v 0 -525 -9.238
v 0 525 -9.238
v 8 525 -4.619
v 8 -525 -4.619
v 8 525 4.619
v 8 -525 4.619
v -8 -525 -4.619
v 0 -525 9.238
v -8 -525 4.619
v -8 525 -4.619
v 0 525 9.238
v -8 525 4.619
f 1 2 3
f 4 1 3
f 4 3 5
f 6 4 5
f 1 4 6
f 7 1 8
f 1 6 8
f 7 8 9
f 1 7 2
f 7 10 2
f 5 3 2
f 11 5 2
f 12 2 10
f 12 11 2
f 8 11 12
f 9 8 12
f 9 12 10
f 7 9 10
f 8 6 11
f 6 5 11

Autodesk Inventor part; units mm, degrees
ref_plane "YZ Plane" through (0, 0, 0) normal (1, 0, 0) x (0, 1, 0)
ref_plane "XZ Plane" through (0, 0, 0) normal (0, 1, 0) x (-1, 0, 0)
ref_plane "XY Plane" through (0, 0, 0) normal (0, 0, 1) x (1, 0, 0)
sketch "Sketch1" plane through (0, 0, 0) normal (0, 1, 0) x (-1, 0, 0)
  circle A0 centre (0, 0) radius 6.35
  line L0 (0, -9.2376) -> (-8, -4.6188)
  line L1 (-8, -4.6188) -> (-8, 4.6188)
  line L2 (-8, 4.6188) -> (0, 9.2376)
  line L3 (0, 9.2376) -> (8, 4.6188)
  line L4 (8, 4.6188) -> (8, -4.6188)
  line L5 (8, -4.6188) -> (0, -9.2376)
  dimension "d0" = 12.7
  dimension "d3" = 16
extrude "Extrusion1" add sketch "Sketch1" along normal mid plane 1050 contours A0 | L0 L1 L2 L3 L4 L5
properties part number "varilla"
